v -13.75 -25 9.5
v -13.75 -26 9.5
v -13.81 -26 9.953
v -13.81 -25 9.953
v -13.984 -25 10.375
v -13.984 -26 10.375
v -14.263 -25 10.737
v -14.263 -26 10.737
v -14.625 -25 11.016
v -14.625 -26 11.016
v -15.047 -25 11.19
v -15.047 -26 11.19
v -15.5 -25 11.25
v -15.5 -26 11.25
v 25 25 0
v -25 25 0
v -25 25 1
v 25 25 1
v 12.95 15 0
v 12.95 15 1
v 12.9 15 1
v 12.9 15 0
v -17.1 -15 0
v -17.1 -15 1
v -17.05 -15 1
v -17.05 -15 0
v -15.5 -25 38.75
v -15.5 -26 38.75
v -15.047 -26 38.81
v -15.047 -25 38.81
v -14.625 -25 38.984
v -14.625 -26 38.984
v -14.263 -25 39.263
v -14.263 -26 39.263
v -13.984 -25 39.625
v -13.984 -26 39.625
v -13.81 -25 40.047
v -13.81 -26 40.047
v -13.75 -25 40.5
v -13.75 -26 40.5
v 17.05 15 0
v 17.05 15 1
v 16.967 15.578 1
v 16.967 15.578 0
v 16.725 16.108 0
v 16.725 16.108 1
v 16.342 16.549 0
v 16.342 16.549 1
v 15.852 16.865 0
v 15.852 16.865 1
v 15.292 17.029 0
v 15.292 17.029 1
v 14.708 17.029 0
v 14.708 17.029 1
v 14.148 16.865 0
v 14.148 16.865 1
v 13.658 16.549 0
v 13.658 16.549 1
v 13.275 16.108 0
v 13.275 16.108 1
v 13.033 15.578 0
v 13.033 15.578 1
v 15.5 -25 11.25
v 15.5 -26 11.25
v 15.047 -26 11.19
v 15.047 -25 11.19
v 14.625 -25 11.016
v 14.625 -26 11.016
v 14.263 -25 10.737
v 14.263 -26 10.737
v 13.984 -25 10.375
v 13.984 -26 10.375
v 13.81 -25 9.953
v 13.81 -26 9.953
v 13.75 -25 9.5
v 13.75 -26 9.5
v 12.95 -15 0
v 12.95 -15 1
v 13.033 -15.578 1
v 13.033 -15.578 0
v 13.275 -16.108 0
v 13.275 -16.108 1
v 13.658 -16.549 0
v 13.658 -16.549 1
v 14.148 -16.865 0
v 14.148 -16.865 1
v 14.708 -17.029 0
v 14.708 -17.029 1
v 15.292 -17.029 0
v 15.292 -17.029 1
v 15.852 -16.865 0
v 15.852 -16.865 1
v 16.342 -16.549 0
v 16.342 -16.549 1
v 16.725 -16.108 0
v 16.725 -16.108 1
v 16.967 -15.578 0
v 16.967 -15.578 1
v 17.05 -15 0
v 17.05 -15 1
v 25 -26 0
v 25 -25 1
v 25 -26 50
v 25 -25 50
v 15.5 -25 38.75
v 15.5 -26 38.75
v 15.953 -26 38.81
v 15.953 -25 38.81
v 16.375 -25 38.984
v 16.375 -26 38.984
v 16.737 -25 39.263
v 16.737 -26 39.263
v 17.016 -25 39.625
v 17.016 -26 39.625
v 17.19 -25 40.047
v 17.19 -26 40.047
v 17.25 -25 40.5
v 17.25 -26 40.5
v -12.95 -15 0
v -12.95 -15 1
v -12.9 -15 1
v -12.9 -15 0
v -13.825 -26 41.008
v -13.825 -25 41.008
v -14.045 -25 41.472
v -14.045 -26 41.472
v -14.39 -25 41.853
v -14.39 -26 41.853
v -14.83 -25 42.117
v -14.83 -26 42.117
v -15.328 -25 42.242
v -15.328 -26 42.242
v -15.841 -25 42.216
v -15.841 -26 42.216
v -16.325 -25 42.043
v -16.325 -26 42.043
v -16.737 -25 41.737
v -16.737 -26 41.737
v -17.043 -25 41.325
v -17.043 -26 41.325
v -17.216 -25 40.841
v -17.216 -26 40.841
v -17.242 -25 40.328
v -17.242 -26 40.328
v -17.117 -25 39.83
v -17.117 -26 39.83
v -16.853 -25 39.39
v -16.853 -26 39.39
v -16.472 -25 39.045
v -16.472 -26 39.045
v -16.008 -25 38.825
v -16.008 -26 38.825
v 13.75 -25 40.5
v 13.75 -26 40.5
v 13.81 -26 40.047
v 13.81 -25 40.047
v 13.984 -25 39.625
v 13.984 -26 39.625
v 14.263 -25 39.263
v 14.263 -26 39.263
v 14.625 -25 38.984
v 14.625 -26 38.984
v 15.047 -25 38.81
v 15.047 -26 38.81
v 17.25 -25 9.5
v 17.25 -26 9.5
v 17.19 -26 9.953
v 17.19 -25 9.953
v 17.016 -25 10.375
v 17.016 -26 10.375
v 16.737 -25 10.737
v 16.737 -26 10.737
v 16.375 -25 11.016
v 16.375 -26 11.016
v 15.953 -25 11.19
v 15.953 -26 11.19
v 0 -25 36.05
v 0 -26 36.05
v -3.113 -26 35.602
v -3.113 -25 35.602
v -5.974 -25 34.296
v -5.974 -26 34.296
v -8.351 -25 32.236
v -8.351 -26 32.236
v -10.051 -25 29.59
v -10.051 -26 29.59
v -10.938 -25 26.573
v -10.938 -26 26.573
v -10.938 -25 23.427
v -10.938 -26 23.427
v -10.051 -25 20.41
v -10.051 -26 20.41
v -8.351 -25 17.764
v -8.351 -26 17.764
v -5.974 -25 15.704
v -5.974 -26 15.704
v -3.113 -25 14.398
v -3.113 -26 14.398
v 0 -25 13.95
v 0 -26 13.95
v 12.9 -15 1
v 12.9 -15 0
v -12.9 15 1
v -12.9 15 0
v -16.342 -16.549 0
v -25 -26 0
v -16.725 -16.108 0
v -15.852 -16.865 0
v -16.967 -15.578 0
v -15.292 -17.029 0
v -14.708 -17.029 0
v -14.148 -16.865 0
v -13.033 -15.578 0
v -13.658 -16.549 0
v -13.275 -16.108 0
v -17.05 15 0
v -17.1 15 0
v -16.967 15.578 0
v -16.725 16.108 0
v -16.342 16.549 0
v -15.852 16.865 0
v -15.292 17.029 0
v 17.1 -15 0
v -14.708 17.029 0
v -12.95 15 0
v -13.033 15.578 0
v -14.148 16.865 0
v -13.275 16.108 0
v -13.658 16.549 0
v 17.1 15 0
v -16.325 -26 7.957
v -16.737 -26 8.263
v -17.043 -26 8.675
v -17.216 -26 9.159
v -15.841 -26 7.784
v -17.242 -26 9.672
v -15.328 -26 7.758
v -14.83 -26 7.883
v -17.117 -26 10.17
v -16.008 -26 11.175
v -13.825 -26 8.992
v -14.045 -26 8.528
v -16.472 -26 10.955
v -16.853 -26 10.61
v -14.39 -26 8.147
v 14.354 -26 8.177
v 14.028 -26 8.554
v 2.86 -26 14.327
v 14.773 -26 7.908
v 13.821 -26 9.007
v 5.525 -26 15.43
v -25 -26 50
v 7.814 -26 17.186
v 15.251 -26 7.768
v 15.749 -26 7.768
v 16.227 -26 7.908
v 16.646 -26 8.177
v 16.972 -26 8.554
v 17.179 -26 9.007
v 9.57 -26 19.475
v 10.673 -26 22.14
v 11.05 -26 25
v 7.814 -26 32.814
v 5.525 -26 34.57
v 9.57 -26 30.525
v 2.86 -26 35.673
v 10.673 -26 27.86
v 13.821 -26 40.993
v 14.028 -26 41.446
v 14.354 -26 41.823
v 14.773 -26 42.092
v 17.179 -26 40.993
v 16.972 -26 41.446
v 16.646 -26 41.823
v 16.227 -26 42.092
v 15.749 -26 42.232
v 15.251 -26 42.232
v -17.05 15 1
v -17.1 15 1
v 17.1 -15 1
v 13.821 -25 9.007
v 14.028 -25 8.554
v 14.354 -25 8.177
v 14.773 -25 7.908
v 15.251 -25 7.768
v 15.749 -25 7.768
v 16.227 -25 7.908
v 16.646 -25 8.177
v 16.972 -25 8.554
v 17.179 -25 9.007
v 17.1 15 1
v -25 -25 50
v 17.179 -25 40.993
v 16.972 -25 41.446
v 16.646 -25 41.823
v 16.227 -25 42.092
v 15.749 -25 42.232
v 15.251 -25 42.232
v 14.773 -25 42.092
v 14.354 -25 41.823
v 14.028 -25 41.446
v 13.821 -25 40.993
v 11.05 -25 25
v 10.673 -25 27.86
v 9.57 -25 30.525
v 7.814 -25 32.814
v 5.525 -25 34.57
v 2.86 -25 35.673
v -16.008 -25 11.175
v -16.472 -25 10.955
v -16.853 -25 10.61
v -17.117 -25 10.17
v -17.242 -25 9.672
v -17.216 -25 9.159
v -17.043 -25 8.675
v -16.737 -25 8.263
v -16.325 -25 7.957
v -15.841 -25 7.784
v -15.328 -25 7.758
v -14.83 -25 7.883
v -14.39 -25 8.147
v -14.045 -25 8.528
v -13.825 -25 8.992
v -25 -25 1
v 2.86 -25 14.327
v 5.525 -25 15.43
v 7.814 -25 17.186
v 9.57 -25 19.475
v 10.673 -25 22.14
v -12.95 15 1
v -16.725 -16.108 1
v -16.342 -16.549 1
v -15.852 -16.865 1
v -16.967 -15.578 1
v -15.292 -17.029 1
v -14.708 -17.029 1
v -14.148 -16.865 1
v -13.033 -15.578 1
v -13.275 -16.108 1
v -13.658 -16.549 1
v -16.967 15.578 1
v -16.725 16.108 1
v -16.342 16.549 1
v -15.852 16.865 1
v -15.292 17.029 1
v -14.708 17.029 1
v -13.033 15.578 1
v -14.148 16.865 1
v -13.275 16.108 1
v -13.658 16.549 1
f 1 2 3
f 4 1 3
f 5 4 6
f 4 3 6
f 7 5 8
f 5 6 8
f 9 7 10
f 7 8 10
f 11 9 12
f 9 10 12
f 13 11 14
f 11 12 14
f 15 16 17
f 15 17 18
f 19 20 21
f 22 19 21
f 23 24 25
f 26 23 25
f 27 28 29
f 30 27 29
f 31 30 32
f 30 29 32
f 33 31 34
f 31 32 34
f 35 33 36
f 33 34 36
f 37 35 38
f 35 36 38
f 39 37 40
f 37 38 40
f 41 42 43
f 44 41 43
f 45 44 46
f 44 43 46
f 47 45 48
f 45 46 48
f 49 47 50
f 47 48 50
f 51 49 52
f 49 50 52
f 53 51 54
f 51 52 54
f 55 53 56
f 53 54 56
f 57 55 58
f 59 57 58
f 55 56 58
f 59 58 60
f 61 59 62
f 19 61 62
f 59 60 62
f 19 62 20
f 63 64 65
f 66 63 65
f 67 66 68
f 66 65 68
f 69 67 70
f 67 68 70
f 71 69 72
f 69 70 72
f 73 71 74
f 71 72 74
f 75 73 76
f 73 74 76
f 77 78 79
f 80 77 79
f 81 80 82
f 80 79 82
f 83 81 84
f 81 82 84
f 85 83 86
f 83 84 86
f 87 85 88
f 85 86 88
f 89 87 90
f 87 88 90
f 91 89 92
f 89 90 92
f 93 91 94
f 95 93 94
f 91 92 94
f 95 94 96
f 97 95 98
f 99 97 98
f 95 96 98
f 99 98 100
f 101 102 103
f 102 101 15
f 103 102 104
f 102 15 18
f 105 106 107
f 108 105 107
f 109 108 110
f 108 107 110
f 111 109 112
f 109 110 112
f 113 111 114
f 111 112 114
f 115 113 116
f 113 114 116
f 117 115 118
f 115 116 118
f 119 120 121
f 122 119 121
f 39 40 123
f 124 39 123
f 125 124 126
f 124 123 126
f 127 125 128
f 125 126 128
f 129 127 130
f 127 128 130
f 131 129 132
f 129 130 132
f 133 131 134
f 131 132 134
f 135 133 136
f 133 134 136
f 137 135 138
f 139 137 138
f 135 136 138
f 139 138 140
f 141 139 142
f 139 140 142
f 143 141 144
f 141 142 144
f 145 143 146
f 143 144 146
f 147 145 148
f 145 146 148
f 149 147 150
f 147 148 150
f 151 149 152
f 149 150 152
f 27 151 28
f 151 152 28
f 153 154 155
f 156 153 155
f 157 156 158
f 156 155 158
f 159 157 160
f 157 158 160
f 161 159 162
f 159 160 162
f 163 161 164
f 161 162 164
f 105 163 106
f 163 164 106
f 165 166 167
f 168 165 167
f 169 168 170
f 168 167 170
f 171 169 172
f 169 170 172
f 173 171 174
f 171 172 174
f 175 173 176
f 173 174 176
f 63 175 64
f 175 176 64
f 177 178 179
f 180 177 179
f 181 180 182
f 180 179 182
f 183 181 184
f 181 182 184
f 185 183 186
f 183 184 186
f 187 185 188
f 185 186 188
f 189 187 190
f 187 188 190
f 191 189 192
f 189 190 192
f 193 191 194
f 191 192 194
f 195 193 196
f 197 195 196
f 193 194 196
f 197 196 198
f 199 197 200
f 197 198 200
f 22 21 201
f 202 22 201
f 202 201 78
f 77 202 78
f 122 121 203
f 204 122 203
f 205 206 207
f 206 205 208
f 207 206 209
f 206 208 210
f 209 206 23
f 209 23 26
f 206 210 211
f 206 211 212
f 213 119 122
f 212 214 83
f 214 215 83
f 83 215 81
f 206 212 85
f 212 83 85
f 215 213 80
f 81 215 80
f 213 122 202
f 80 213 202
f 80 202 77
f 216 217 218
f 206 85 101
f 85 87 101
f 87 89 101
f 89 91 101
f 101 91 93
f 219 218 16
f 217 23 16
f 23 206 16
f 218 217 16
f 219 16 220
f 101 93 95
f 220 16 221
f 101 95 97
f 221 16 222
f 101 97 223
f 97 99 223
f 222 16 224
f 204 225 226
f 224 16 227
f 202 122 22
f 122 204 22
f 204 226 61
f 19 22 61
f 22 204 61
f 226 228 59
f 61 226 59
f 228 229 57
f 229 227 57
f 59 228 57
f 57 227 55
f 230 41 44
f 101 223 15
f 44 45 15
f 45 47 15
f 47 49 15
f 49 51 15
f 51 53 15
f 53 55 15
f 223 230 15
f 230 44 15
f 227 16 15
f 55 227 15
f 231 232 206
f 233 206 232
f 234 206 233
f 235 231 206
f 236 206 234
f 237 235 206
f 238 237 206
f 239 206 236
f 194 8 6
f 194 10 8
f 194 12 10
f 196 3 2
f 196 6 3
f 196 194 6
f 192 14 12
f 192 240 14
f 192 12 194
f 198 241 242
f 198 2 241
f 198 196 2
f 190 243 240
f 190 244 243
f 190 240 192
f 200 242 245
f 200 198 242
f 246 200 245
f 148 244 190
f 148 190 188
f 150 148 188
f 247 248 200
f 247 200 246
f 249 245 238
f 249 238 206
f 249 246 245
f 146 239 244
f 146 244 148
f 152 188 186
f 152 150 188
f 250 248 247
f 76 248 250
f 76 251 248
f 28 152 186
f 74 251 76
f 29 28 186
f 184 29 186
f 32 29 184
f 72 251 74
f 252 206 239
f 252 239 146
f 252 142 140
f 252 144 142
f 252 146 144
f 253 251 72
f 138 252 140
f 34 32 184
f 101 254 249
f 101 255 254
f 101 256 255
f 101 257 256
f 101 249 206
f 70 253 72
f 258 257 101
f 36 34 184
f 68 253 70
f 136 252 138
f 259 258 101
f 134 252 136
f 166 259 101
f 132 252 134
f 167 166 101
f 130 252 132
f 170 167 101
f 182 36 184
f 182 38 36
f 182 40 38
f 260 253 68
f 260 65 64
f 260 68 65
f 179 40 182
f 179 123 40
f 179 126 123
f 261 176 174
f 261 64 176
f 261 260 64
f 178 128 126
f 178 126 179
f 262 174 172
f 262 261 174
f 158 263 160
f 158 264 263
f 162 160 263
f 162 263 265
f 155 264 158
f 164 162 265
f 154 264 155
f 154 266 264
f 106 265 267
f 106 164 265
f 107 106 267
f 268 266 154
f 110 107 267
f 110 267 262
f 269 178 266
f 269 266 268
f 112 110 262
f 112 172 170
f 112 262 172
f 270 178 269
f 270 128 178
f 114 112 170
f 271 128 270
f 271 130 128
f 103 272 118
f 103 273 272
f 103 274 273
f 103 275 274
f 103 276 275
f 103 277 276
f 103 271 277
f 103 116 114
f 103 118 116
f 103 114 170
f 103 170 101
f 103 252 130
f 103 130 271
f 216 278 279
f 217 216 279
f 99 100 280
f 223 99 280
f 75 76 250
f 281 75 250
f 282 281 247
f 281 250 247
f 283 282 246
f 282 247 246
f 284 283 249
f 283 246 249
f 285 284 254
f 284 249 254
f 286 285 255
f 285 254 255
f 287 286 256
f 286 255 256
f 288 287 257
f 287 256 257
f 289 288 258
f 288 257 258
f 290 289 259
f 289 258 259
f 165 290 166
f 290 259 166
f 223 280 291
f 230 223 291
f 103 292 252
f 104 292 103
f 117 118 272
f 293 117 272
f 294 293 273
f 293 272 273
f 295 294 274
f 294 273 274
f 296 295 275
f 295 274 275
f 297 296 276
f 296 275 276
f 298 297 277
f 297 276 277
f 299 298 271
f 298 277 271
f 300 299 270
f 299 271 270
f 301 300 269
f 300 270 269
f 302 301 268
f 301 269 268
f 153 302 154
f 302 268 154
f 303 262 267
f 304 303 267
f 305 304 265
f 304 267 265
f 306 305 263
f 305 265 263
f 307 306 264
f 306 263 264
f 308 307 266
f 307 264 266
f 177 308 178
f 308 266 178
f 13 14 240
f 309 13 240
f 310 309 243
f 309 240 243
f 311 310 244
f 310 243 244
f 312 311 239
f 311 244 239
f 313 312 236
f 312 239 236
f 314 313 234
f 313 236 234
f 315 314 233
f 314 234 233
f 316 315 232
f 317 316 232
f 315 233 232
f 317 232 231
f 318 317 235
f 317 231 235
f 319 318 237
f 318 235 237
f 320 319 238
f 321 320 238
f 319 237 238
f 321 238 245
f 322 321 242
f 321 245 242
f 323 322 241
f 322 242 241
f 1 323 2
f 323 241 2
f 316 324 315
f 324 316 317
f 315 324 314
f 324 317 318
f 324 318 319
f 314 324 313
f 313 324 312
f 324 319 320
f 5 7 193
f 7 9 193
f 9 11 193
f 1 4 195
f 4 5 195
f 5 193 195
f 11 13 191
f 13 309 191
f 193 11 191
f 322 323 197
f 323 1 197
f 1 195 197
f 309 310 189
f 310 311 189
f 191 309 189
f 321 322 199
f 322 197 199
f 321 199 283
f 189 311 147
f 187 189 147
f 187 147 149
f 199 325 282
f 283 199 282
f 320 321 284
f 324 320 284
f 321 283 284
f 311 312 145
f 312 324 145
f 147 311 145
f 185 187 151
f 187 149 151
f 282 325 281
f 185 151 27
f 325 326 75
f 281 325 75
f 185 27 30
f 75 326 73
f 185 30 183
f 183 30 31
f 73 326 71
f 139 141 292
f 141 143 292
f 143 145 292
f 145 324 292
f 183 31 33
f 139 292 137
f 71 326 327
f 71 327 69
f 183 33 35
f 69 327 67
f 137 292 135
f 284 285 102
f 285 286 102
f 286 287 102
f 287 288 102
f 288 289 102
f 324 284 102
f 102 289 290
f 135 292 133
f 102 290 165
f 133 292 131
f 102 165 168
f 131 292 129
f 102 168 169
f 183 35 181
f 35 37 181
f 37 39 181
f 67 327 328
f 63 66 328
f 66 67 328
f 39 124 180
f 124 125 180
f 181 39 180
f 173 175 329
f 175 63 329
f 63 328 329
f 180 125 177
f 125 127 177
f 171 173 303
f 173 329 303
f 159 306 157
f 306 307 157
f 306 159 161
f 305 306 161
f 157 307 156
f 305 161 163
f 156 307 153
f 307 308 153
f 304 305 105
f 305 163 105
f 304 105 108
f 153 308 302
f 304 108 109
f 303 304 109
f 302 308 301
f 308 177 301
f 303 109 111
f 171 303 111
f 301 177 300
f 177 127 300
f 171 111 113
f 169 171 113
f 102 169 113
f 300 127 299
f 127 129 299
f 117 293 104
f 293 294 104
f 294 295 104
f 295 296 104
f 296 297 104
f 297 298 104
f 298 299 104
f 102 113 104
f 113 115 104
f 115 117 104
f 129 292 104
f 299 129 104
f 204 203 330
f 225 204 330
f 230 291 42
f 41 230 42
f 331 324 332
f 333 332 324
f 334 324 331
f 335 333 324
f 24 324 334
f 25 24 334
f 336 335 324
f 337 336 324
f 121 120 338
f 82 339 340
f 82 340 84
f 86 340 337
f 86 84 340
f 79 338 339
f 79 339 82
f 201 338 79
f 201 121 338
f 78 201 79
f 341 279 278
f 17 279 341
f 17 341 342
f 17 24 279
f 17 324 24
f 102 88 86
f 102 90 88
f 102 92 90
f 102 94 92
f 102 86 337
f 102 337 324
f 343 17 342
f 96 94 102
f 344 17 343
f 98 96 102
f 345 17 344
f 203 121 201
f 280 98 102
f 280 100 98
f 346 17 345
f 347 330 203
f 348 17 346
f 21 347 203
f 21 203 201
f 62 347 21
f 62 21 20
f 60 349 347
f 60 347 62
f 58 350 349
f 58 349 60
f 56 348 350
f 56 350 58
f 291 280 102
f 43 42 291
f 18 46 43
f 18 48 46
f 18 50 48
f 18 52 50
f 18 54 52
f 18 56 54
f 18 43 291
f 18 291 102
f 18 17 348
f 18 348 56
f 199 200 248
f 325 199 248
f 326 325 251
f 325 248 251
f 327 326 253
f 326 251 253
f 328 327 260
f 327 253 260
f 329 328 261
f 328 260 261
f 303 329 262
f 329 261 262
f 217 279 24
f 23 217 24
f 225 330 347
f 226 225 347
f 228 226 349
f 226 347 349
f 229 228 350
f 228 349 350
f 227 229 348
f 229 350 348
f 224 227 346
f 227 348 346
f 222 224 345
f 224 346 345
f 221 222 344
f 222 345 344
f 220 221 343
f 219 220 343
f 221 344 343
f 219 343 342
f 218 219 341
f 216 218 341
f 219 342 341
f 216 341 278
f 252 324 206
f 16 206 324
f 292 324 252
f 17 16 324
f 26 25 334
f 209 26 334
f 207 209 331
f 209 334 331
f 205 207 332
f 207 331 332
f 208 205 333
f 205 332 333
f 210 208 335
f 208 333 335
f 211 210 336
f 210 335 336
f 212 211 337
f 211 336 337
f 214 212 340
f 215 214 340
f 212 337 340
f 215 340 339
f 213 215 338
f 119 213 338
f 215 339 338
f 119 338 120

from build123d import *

# Parameters (mm, degrees)
F0_W     = 50
F0_H     = 50
F1_DEPTH = 1
F2_W     = 50
F2_H     = 50
F3_DEPTH = 1
F5_DEPTH = 1
F7_DEPTH = 1


with BuildPart() as f1:
    # F0 (on Top) → F1 (new body)
    with BuildSketch(Plane.XY):
        Rectangle(F0_W, F0_H)
    extrude(amount=F1_DEPTH)

    # F2 (on face) → F3 (join)
    with BuildSketch(Plane.XZ.offset(25)):
        with Locations((0, 25)):
            Rectangle(F2_W, F2_H)
    extrude(amount=F3_DEPTH)

    # F4 (on face) → F5 (cut)
    with BuildSketch(Plane.XZ.offset(26)):
        with BuildLine():
            Line((15.5, 40.5), (13.75, 40.5))
            ThreePointArc((13.75, 40.5), (14.2625631329, 39.2625631329), (15.5, 38.75))
            Line((15.5, 38.75), (15.5, 40.5))
        make_face()
        with BuildLine():
            ThreePointArc((17.25, 40.5), (15.5, 42.25), (13.75, 40.5))
            Line((13.75, 40.5), (15.5, 40.5))
            Line((15.5, 40.5), (15.5, 38.75))
            ThreePointArc((15.5, 38.75), (16.7374368671, 39.2625631329), (17.25, 40.5))
        make_face()
        with BuildLine():
            ThreePointArc((-15.5, 38.75), (-14.2625631329, 39.2625631329), (-13.75, 40.5))
            Line((-13.75, 40.5), (-15.5, 40.5))
            Line((-15.5, 40.5), (-15.5, 38.75))
        make_face()
        with BuildLine():
            Line((-15.5, 40.5), (-13.75, 40.5))
            ThreePointArc((-13.75, 40.5), (-16.7374368671, 41.7374368671), (-15.5, 38.75))
            Line((-15.5, 38.75), (-15.5, 40.5))
        make_face()
        with BuildLine():
            Line((15.5, 9.5), (15.5, 11.25))
            ThreePointArc((15.5, 11.25), (14.2625631329, 10.7374368671), (13.75, 9.5))
            Line((13.75, 9.5), (15.5, 9.5))
        make_face()
        with BuildLine():
            ThreePointArc((17.25, 9.5), (16.7374368671, 10.7374368671), (15.5, 11.25))
            Line((15.5, 11.25), (15.5, 9.5))
            Line((15.5, 9.5), (13.75, 9.5))
            ThreePointArc((13.75, 9.5), (15.5, 7.75), (17.25, 9.5))
        make_face()
        with BuildLine():
            ThreePointArc((-13.75, 9.5), (-14.2625631329, 10.7374368671), (-15.5, 11.25))
            Line((-15.5, 11.25), (-15.5, 9.5))
            Line((-15.5, 9.5), (-13.75, 9.5))
        make_face()
        with BuildLine():
            Line((-15.5, 9.5), (-15.5, 11.25))
            ThreePointArc((-15.5, 11.25), (-16.7374368671, 8.2625631329), (-13.75, 9.5))
            Line((-13.75, 9.5), (-15.5, 9.5))
        make_face()
        with BuildLine():
            Line((0, 13.95), (0, 36.05))
            ThreePointArc((0, 36.05), (-11.05, 25), (0, 13.95))
        make_face()
        with BuildLine():
            ThreePointArc((11.05, 25), (7.8135299321, 32.8135299321), (0, 36.05))
            Line((0, 36.05), (0, 13.95))
            ThreePointArc((0, 13.95), (7.8135299321, 17.1864700679), (11.05, 25))
        make_face()
    extrude(amount=-F5_DEPTH, mode=Mode.SUBTRACT)

    # F6 (on face) → F7 (cut)
    with BuildSketch(Plane.XY.offset(1)):
        with BuildLine():
            Line((-15, 12.95), (-15, 15))
            Line((-15, 15), (-17.05, 15))
            ThreePointArc((-17.05, 15), (-16.4495689014, 13.5504310986), (-15, 12.95))
        make_face()
        with BuildLine():
            Line((-12.95, 15), (-15, 15))
            Line((-15, 15), (-15, 12.95))
            ThreePointArc((-15, 12.95), (-13.5504310986, 13.5504310986), (-12.95, 15))
        make_face()
        with BuildLine():
            Line((-15, -15), (-15, -12.95))
            ThreePointArc((-15, -12.95), (-16.4495689014, -13.5504310986), (-17.05, -15))
            Line((-17.05, -15), (-15, -15))
        make_face()
        with BuildLine():
            ThreePointArc((-12.95, -15), (-13.5504310986, -13.5504310986), (-15, -12.95))
            Line((-15, -12.95), (-15, -15))
            Line((-15, -15), (-12.95, -15))
        make_face()
        with BuildLine():
            Line((15, 15), (12.95, 15))
            ThreePointArc((12.95, 15), (13.5504310986, 13.5504310986), (15, 12.95))
            Line((15, 12.95), (15, 15))
        make_face()
        with BuildLine():
            Line((17.05, 15), (15, 15))
            Line((15, 15), (15, 12.95))
            ThreePointArc((15, 12.95), (16.4495689014, 13.5504310986), (17.05, 15))
        make_face()
        with BuildLine():
            ThreePointArc((15, -12.95), (13.5504310986, -13.5504310986), (12.95, -15))
            Line((12.95, -15), (15, -15))
            Line((15, -15), (15, -12.95))
        make_face()
        with BuildLine():
            ThreePointArc((17.05, -15), (16.4495689014, -13.5504310986), (15, -12.95))
            Line((15, -12.95), (15, -15))
            Line((15, -15), (17.05, -15))
        make_face()
        with BuildLine():
            ThreePointArc((17.05, 15), (15, 17.05), (12.95, 15))
            Line((12.95, 15), (15, 15))
            Line((15, 15), (17.05, 15))
        make_face()
        with BuildLine():
            Line((15, -15), (12.95, -15))
            ThreePointArc((12.95, -15), (15, -17.05), (17.05, -15))
            Line((17.05, -15), (15, -15))
        make_face()
        with BuildLine():
            Line((-17.05, 15), (-15, 15))
            Line((-15, 15), (-12.95, 15))
            ThreePointArc((-12.95, 15), (-15, 17.05), (-17.05, 15))
        make_face()
        with BuildLine():
            Line((-12.95, -15), (-15, -15))
            Line((-15, -15), (-17.05, -15))
            ThreePointArc((-17.05, -15), (-15, -17.05), (-12.95, -15))
        make_face()
        with BuildLine():
            Line((-15, -12.95), (-15, 12.95))
            ThreePointArc((-15, 12.95), (-16.4495689014, 13.5504310986), (-17.05, 15))
            Line((-17.05, 15), (-17.1, 15))
            Line((-17.1, 15), (-17.1, -15))
            Line((-17.1, -15), (-17.05, -15))
            ThreePointArc((-17.05, -15), (-16.4495689014, -13.5504310986), (-15, -12.95))
        make_face()
        with BuildLine():
            Line((17.1, 15), (17.05, 15))
            ThreePointArc((17.05, 15), (16.4495689014, 13.5504310986), (15, 12.95))
            Line((15, 12.95), (15, -12.95))
            ThreePointArc((15, -12.95), (16.4495689014, -13.5504310986), (17.05, -15))
            Line((17.05, -15), (17.1, -15))
            Line((17.1, -15), (17.1, 15))
        make_face()
        with BuildLine():
            Line((-12.9, 15), (-12.95, 15))
            ThreePointArc((-12.95, 15), (-13.5504310986, 13.5504310986), (-15, 12.95))
            Line((-15, 12.95), (-15, -12.95))
            ThreePointArc((-15, -12.95), (-13.5504310986, -13.5504310986), (-12.95, -15))
            Line((-12.95, -15), (-12.9, -15))
            Line((-12.9, -15), (-12.9, 15))
        make_face()
        with BuildLine():
            Line((12.95, 15), (12.9, 15))
            Line((12.9, 15), (12.9, -15))
            Line((12.9, -15), (12.95, -15))
            ThreePointArc((12.95, -15), (13.5504310986, -13.5504310986), (15, -12.95))
            Line((15, -12.95), (15, 12.95))
            ThreePointArc((15, 12.95), (13.5504310986, 13.5504310986), (12.95, 15))
        make_face()
    extrude(amount=-F7_DEPTH, mode=Mode.SUBTRACT)


solid = f1.part
